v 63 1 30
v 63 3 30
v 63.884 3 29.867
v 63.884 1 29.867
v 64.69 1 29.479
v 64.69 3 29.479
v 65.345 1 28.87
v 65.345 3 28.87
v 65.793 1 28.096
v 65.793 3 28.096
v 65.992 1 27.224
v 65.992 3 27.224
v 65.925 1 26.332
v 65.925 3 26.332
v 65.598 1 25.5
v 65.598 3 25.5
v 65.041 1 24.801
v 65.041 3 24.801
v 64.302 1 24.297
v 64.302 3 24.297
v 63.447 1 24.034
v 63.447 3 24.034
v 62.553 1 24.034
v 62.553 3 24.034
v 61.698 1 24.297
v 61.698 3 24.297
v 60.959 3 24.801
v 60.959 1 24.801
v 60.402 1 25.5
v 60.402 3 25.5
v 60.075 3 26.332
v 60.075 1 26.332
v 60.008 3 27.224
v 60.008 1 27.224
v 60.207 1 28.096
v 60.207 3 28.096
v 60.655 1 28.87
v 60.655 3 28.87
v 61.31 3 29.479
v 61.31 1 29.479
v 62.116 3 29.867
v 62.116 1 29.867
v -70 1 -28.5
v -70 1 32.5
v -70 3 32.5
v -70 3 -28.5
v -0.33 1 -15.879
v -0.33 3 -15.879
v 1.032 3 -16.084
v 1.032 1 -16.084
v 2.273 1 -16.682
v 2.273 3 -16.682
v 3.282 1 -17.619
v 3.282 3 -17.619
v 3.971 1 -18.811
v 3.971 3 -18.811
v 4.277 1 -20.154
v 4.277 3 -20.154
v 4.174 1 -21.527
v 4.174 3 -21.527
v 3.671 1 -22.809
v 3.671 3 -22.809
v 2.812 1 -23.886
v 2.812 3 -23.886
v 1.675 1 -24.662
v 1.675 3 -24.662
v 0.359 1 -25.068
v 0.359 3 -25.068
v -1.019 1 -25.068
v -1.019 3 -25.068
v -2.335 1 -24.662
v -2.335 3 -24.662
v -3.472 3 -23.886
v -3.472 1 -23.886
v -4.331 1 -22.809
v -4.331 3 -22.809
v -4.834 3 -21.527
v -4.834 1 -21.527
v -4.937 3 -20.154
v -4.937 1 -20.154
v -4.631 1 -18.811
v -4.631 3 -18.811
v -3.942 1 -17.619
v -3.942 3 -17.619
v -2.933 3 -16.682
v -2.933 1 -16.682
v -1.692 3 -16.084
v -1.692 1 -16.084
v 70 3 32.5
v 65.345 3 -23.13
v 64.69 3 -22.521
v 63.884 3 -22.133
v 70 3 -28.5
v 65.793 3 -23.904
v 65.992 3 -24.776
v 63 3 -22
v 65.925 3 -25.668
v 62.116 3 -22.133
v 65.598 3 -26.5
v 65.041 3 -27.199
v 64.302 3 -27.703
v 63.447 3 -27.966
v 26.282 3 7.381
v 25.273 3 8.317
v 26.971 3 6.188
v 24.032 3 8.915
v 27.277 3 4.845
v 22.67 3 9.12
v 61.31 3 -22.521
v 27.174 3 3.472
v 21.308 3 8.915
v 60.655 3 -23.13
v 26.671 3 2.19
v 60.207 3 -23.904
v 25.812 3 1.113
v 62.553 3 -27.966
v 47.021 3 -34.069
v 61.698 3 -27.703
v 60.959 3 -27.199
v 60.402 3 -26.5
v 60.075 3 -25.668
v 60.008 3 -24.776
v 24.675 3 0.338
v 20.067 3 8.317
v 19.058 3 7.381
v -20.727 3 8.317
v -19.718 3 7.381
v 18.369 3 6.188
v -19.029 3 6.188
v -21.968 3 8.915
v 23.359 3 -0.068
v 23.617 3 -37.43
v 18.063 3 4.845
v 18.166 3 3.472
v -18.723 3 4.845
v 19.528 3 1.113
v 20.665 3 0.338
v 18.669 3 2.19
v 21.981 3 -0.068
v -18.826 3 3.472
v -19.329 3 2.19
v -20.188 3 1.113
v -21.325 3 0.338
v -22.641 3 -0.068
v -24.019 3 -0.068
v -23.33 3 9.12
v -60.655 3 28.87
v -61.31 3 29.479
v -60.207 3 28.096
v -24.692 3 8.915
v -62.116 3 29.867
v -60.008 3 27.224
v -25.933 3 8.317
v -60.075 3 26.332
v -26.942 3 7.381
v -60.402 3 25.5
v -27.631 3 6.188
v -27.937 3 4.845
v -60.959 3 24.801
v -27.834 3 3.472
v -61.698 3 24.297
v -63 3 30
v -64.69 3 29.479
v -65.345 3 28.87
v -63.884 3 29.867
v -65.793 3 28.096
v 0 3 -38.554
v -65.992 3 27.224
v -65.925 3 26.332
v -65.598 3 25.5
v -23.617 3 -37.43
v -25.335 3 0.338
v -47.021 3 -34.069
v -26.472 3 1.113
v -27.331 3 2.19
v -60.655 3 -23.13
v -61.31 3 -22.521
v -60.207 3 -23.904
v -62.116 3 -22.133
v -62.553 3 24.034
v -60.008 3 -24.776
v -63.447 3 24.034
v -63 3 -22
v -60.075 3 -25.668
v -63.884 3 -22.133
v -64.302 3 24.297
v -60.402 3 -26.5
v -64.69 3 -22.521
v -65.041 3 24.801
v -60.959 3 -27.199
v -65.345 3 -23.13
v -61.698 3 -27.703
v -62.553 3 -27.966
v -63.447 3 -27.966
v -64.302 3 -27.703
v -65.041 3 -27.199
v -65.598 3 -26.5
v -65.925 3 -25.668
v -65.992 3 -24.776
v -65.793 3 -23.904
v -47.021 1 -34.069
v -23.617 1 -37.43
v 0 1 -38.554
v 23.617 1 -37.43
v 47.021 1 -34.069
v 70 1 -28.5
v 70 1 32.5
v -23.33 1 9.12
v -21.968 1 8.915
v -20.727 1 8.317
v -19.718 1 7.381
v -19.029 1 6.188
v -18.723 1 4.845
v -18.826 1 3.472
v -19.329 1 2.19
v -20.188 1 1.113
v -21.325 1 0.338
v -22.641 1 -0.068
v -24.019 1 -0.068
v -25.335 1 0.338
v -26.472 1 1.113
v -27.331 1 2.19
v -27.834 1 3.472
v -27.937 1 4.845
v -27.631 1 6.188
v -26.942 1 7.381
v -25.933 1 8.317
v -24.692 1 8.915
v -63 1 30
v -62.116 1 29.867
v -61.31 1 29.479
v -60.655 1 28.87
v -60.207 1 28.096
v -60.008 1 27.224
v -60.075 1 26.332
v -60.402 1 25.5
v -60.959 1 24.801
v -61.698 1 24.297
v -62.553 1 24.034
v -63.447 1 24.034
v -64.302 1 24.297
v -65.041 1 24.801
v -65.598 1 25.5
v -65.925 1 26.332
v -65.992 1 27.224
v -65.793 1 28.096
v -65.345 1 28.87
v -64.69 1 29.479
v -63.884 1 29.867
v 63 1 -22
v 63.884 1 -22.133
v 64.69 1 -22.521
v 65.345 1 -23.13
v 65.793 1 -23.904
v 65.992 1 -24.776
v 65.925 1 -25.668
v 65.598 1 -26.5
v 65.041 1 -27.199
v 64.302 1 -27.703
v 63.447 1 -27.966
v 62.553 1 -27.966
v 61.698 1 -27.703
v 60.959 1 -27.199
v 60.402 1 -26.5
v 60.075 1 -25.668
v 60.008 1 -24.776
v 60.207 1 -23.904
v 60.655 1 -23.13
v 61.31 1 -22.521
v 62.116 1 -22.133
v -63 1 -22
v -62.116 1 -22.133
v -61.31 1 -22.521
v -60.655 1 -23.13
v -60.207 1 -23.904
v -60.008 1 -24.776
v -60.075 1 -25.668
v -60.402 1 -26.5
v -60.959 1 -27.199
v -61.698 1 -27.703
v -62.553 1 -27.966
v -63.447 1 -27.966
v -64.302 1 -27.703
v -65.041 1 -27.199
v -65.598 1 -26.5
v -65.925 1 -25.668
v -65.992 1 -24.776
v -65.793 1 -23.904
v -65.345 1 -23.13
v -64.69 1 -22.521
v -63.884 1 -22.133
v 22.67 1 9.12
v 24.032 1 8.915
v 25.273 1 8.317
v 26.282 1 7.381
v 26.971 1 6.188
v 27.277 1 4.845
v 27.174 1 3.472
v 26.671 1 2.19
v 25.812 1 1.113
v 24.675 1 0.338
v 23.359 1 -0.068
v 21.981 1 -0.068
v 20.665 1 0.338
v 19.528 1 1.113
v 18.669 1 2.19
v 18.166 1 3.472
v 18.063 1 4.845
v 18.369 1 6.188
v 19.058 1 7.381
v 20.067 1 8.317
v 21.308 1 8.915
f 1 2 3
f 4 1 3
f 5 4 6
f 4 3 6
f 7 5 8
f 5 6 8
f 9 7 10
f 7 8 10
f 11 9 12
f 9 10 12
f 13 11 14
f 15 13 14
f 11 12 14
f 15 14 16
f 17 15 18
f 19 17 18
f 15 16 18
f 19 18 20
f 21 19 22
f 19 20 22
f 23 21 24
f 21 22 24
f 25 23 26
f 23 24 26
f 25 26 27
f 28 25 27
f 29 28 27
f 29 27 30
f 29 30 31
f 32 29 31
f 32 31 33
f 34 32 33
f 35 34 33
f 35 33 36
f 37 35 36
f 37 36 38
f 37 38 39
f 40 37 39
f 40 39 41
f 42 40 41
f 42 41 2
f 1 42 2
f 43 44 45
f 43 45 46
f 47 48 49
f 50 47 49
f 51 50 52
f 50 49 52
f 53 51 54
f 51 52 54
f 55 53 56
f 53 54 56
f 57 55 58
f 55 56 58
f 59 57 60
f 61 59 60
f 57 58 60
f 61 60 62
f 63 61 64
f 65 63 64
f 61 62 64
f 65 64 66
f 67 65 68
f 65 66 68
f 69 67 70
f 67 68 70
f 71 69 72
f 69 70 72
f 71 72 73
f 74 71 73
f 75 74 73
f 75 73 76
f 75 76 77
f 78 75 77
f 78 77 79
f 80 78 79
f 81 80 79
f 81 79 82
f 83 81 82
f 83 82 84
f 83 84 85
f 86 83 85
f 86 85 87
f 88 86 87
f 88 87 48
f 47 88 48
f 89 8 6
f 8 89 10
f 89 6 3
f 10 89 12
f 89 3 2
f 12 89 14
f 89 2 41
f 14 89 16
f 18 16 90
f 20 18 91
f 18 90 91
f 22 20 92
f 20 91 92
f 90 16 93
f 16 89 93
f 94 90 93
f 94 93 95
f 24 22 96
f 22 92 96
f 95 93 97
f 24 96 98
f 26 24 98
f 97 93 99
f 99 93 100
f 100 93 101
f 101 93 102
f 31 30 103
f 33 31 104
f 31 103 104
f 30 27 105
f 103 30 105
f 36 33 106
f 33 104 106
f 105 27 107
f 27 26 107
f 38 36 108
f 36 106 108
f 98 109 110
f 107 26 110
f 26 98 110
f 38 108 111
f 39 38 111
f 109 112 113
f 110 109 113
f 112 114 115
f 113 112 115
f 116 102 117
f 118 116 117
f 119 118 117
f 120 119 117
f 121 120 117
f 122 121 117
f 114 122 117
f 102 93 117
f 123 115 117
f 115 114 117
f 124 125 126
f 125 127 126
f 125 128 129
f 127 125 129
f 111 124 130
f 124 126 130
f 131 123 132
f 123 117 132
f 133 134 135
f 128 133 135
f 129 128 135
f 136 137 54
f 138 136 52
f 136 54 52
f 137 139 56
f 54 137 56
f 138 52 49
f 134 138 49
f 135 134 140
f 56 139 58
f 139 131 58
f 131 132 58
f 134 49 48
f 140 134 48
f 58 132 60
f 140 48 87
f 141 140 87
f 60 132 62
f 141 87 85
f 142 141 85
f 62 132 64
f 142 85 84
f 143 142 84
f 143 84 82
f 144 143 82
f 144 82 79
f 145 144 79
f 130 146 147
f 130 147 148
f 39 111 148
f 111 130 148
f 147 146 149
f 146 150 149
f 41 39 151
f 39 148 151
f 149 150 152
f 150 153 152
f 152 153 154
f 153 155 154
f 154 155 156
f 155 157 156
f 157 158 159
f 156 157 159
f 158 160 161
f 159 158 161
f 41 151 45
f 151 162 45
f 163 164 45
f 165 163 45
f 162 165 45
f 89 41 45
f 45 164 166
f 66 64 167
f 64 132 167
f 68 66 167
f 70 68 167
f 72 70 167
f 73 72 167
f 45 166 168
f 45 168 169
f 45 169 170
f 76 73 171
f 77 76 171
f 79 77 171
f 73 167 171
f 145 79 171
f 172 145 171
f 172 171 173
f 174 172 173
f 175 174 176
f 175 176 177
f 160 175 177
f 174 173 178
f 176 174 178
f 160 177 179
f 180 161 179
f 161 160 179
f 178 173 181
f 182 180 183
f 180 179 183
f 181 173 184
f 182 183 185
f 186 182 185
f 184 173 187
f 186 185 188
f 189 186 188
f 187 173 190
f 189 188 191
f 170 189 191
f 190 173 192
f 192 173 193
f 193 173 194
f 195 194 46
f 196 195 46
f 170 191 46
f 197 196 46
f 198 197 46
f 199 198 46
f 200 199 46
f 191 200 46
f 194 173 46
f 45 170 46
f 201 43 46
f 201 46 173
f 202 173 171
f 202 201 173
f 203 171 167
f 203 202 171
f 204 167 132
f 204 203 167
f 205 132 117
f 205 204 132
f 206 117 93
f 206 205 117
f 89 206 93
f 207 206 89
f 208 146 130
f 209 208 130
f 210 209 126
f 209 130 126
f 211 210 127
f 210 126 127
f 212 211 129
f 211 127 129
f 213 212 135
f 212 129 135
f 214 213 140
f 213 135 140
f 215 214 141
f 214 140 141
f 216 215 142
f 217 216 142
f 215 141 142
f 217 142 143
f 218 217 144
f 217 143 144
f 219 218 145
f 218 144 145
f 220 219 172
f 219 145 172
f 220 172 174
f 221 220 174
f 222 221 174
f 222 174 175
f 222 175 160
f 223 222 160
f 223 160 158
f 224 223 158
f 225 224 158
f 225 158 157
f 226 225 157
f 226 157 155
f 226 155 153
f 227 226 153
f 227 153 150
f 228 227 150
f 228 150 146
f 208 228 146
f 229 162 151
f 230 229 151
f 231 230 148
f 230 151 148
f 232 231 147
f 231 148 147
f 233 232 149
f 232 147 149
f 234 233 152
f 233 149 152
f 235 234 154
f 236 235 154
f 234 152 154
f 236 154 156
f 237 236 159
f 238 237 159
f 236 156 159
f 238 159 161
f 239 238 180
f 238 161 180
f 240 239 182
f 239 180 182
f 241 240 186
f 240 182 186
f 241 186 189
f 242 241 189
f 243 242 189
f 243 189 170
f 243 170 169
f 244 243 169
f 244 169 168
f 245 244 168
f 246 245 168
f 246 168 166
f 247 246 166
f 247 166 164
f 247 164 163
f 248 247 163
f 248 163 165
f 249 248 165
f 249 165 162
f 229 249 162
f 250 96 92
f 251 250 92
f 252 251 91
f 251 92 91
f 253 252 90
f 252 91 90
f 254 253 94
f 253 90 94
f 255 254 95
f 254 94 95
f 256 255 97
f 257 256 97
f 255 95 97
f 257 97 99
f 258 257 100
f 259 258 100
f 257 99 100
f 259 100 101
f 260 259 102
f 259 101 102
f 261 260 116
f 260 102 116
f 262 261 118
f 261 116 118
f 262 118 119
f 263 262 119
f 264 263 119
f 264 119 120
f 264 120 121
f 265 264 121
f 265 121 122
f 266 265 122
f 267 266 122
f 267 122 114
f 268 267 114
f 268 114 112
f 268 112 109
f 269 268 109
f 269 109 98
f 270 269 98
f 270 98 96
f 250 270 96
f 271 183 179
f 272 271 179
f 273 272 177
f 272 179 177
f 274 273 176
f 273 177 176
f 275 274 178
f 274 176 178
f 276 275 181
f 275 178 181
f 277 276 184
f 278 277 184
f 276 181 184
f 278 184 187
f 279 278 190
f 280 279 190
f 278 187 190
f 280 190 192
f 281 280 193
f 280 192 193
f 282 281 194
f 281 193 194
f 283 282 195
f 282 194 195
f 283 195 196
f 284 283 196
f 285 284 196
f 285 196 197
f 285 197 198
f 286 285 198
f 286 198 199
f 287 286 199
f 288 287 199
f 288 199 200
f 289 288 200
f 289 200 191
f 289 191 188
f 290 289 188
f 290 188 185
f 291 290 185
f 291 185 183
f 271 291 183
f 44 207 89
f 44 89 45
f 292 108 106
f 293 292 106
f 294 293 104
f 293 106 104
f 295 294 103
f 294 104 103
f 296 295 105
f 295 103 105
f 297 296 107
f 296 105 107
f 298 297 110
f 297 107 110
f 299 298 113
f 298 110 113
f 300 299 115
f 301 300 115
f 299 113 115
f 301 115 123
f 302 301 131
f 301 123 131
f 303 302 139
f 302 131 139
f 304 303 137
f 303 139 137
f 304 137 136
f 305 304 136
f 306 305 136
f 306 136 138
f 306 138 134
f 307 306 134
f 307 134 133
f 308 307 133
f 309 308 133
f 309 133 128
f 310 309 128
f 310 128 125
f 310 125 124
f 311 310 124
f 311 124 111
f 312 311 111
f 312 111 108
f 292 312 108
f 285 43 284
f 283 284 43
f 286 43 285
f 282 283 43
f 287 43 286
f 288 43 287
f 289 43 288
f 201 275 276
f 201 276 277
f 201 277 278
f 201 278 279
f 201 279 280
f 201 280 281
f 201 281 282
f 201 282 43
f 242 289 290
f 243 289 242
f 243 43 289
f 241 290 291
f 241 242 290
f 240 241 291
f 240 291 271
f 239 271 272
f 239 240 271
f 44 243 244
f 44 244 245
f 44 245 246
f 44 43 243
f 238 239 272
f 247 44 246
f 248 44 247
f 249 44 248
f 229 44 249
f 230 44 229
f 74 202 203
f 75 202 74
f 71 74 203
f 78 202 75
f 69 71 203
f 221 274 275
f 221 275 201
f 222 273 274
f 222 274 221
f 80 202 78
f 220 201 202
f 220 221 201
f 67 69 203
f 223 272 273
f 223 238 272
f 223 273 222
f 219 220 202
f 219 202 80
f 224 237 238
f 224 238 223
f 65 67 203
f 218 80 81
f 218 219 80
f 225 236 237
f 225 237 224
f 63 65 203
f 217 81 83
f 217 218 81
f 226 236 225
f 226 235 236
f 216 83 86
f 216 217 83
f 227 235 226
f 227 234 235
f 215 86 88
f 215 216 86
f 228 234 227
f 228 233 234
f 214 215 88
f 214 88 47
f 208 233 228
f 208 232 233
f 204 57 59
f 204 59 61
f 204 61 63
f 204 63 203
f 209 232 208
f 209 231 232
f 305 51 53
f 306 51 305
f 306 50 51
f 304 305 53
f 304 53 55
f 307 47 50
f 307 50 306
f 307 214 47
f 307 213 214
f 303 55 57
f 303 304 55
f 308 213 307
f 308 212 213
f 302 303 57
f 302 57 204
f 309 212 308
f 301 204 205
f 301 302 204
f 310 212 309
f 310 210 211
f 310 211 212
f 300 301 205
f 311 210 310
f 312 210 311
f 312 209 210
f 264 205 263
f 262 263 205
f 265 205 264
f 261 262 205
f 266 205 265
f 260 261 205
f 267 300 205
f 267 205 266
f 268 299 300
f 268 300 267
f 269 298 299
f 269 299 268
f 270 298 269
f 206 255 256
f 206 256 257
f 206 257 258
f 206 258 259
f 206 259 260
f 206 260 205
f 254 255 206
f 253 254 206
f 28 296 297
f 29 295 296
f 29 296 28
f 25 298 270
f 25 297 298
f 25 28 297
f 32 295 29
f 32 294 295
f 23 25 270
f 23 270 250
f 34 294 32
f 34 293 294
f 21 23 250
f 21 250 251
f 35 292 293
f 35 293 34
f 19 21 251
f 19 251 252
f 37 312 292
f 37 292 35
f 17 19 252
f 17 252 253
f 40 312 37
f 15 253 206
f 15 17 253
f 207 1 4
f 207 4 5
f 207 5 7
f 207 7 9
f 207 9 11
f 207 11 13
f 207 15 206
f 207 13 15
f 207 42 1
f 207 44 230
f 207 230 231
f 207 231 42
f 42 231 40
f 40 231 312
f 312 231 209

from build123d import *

# Parameters (mm, degrees)
BOSS_EXTRUDE1_DEPTH = 3
SKETCH3_R           = 3
CUT_EXTRUDE1_DEPTH  = 10
SKETCH4_R           = 4.62
CUT_EXTRUDE2_DEPTH  = 10
SKETCH5_W           = 140
SKETCH5_H           = 1
CUT_EXTRUDE3_DEPTH  = 80


with BuildPart() as part:
    # Sketch1 → Boss-Extrude1 (new body)
    with BuildSketch(Plane(origin=(0, 0, 0), x_dir=(1, 0, 0), z_dir=(0, 1, 0))):
        with BuildLine():
            Line((70, 28.5), (70, -32.5))
            Line((70, -32.5), (-70, -32.5))
            Line((-70, -32.5), (-70, 28.5))
            ThreePointArc((-70, 28.5), (0, 38.554020598), (70, 28.5))
        make_face()
    extrude(amount=BOSS_EXTRUDE1_DEPTH)

    # Sketch3 → Cut-Extrude1 (cut)
    with BuildSketch(Plane(origin=(0, 3, 0), x_dir=(1, 0, 0), z_dir=(0, 1, 0))):
        with Locations(Location((-63, 25, 0), (0, 0, 270))):
            Circle(SKETCH3_R)
        with Locations(Location((-63, -27, 0), (0, 0, 270))):
            Circle(SKETCH3_R)
        with Locations(Location((63, 25, 0), (0, 0, 270))):
            Circle(SKETCH3_R)
        with Locations(Location((63, -27, 0), (0, 0, 270))):
            Circle(SKETCH3_R)
    extrude(amount=-CUT_EXTRUDE1_DEPTH, mode=Mode.SUBTRACT)

    # Sketch4 → Cut-Extrude2 (cut)
    with BuildSketch(Plane(origin=(0, 3, 0), x_dir=(1, 0, 0), z_dir=(0, 1, 0))):
        with Locations(Location((-23.33, -4.5, 0), (0, 0, 270))):
            Circle(SKETCH4_R)
        with Locations(Location((22.67, -4.5, 0), (0, 0, 270))):
            Circle(SKETCH4_R)
        with Locations(Location((-0.33, 20.499217988, 0), (0, 0, 270))):
            Circle(SKETCH4_R)
    extrude(amount=-CUT_EXTRUDE2_DEPTH, mode=Mode.SUBTRACT)

    # Sketch5 → Cut-Extrude3 (cut)
    with BuildSketch(Plane.XY.offset(32.5)):
        with Locations((0, 0.5)):
            Rectangle(SKETCH5_W, SKETCH5_H)
    extrude(amount=-CUT_EXTRUDE3_DEPTH, mode=Mode.SUBTRACT)


solid = part.part
